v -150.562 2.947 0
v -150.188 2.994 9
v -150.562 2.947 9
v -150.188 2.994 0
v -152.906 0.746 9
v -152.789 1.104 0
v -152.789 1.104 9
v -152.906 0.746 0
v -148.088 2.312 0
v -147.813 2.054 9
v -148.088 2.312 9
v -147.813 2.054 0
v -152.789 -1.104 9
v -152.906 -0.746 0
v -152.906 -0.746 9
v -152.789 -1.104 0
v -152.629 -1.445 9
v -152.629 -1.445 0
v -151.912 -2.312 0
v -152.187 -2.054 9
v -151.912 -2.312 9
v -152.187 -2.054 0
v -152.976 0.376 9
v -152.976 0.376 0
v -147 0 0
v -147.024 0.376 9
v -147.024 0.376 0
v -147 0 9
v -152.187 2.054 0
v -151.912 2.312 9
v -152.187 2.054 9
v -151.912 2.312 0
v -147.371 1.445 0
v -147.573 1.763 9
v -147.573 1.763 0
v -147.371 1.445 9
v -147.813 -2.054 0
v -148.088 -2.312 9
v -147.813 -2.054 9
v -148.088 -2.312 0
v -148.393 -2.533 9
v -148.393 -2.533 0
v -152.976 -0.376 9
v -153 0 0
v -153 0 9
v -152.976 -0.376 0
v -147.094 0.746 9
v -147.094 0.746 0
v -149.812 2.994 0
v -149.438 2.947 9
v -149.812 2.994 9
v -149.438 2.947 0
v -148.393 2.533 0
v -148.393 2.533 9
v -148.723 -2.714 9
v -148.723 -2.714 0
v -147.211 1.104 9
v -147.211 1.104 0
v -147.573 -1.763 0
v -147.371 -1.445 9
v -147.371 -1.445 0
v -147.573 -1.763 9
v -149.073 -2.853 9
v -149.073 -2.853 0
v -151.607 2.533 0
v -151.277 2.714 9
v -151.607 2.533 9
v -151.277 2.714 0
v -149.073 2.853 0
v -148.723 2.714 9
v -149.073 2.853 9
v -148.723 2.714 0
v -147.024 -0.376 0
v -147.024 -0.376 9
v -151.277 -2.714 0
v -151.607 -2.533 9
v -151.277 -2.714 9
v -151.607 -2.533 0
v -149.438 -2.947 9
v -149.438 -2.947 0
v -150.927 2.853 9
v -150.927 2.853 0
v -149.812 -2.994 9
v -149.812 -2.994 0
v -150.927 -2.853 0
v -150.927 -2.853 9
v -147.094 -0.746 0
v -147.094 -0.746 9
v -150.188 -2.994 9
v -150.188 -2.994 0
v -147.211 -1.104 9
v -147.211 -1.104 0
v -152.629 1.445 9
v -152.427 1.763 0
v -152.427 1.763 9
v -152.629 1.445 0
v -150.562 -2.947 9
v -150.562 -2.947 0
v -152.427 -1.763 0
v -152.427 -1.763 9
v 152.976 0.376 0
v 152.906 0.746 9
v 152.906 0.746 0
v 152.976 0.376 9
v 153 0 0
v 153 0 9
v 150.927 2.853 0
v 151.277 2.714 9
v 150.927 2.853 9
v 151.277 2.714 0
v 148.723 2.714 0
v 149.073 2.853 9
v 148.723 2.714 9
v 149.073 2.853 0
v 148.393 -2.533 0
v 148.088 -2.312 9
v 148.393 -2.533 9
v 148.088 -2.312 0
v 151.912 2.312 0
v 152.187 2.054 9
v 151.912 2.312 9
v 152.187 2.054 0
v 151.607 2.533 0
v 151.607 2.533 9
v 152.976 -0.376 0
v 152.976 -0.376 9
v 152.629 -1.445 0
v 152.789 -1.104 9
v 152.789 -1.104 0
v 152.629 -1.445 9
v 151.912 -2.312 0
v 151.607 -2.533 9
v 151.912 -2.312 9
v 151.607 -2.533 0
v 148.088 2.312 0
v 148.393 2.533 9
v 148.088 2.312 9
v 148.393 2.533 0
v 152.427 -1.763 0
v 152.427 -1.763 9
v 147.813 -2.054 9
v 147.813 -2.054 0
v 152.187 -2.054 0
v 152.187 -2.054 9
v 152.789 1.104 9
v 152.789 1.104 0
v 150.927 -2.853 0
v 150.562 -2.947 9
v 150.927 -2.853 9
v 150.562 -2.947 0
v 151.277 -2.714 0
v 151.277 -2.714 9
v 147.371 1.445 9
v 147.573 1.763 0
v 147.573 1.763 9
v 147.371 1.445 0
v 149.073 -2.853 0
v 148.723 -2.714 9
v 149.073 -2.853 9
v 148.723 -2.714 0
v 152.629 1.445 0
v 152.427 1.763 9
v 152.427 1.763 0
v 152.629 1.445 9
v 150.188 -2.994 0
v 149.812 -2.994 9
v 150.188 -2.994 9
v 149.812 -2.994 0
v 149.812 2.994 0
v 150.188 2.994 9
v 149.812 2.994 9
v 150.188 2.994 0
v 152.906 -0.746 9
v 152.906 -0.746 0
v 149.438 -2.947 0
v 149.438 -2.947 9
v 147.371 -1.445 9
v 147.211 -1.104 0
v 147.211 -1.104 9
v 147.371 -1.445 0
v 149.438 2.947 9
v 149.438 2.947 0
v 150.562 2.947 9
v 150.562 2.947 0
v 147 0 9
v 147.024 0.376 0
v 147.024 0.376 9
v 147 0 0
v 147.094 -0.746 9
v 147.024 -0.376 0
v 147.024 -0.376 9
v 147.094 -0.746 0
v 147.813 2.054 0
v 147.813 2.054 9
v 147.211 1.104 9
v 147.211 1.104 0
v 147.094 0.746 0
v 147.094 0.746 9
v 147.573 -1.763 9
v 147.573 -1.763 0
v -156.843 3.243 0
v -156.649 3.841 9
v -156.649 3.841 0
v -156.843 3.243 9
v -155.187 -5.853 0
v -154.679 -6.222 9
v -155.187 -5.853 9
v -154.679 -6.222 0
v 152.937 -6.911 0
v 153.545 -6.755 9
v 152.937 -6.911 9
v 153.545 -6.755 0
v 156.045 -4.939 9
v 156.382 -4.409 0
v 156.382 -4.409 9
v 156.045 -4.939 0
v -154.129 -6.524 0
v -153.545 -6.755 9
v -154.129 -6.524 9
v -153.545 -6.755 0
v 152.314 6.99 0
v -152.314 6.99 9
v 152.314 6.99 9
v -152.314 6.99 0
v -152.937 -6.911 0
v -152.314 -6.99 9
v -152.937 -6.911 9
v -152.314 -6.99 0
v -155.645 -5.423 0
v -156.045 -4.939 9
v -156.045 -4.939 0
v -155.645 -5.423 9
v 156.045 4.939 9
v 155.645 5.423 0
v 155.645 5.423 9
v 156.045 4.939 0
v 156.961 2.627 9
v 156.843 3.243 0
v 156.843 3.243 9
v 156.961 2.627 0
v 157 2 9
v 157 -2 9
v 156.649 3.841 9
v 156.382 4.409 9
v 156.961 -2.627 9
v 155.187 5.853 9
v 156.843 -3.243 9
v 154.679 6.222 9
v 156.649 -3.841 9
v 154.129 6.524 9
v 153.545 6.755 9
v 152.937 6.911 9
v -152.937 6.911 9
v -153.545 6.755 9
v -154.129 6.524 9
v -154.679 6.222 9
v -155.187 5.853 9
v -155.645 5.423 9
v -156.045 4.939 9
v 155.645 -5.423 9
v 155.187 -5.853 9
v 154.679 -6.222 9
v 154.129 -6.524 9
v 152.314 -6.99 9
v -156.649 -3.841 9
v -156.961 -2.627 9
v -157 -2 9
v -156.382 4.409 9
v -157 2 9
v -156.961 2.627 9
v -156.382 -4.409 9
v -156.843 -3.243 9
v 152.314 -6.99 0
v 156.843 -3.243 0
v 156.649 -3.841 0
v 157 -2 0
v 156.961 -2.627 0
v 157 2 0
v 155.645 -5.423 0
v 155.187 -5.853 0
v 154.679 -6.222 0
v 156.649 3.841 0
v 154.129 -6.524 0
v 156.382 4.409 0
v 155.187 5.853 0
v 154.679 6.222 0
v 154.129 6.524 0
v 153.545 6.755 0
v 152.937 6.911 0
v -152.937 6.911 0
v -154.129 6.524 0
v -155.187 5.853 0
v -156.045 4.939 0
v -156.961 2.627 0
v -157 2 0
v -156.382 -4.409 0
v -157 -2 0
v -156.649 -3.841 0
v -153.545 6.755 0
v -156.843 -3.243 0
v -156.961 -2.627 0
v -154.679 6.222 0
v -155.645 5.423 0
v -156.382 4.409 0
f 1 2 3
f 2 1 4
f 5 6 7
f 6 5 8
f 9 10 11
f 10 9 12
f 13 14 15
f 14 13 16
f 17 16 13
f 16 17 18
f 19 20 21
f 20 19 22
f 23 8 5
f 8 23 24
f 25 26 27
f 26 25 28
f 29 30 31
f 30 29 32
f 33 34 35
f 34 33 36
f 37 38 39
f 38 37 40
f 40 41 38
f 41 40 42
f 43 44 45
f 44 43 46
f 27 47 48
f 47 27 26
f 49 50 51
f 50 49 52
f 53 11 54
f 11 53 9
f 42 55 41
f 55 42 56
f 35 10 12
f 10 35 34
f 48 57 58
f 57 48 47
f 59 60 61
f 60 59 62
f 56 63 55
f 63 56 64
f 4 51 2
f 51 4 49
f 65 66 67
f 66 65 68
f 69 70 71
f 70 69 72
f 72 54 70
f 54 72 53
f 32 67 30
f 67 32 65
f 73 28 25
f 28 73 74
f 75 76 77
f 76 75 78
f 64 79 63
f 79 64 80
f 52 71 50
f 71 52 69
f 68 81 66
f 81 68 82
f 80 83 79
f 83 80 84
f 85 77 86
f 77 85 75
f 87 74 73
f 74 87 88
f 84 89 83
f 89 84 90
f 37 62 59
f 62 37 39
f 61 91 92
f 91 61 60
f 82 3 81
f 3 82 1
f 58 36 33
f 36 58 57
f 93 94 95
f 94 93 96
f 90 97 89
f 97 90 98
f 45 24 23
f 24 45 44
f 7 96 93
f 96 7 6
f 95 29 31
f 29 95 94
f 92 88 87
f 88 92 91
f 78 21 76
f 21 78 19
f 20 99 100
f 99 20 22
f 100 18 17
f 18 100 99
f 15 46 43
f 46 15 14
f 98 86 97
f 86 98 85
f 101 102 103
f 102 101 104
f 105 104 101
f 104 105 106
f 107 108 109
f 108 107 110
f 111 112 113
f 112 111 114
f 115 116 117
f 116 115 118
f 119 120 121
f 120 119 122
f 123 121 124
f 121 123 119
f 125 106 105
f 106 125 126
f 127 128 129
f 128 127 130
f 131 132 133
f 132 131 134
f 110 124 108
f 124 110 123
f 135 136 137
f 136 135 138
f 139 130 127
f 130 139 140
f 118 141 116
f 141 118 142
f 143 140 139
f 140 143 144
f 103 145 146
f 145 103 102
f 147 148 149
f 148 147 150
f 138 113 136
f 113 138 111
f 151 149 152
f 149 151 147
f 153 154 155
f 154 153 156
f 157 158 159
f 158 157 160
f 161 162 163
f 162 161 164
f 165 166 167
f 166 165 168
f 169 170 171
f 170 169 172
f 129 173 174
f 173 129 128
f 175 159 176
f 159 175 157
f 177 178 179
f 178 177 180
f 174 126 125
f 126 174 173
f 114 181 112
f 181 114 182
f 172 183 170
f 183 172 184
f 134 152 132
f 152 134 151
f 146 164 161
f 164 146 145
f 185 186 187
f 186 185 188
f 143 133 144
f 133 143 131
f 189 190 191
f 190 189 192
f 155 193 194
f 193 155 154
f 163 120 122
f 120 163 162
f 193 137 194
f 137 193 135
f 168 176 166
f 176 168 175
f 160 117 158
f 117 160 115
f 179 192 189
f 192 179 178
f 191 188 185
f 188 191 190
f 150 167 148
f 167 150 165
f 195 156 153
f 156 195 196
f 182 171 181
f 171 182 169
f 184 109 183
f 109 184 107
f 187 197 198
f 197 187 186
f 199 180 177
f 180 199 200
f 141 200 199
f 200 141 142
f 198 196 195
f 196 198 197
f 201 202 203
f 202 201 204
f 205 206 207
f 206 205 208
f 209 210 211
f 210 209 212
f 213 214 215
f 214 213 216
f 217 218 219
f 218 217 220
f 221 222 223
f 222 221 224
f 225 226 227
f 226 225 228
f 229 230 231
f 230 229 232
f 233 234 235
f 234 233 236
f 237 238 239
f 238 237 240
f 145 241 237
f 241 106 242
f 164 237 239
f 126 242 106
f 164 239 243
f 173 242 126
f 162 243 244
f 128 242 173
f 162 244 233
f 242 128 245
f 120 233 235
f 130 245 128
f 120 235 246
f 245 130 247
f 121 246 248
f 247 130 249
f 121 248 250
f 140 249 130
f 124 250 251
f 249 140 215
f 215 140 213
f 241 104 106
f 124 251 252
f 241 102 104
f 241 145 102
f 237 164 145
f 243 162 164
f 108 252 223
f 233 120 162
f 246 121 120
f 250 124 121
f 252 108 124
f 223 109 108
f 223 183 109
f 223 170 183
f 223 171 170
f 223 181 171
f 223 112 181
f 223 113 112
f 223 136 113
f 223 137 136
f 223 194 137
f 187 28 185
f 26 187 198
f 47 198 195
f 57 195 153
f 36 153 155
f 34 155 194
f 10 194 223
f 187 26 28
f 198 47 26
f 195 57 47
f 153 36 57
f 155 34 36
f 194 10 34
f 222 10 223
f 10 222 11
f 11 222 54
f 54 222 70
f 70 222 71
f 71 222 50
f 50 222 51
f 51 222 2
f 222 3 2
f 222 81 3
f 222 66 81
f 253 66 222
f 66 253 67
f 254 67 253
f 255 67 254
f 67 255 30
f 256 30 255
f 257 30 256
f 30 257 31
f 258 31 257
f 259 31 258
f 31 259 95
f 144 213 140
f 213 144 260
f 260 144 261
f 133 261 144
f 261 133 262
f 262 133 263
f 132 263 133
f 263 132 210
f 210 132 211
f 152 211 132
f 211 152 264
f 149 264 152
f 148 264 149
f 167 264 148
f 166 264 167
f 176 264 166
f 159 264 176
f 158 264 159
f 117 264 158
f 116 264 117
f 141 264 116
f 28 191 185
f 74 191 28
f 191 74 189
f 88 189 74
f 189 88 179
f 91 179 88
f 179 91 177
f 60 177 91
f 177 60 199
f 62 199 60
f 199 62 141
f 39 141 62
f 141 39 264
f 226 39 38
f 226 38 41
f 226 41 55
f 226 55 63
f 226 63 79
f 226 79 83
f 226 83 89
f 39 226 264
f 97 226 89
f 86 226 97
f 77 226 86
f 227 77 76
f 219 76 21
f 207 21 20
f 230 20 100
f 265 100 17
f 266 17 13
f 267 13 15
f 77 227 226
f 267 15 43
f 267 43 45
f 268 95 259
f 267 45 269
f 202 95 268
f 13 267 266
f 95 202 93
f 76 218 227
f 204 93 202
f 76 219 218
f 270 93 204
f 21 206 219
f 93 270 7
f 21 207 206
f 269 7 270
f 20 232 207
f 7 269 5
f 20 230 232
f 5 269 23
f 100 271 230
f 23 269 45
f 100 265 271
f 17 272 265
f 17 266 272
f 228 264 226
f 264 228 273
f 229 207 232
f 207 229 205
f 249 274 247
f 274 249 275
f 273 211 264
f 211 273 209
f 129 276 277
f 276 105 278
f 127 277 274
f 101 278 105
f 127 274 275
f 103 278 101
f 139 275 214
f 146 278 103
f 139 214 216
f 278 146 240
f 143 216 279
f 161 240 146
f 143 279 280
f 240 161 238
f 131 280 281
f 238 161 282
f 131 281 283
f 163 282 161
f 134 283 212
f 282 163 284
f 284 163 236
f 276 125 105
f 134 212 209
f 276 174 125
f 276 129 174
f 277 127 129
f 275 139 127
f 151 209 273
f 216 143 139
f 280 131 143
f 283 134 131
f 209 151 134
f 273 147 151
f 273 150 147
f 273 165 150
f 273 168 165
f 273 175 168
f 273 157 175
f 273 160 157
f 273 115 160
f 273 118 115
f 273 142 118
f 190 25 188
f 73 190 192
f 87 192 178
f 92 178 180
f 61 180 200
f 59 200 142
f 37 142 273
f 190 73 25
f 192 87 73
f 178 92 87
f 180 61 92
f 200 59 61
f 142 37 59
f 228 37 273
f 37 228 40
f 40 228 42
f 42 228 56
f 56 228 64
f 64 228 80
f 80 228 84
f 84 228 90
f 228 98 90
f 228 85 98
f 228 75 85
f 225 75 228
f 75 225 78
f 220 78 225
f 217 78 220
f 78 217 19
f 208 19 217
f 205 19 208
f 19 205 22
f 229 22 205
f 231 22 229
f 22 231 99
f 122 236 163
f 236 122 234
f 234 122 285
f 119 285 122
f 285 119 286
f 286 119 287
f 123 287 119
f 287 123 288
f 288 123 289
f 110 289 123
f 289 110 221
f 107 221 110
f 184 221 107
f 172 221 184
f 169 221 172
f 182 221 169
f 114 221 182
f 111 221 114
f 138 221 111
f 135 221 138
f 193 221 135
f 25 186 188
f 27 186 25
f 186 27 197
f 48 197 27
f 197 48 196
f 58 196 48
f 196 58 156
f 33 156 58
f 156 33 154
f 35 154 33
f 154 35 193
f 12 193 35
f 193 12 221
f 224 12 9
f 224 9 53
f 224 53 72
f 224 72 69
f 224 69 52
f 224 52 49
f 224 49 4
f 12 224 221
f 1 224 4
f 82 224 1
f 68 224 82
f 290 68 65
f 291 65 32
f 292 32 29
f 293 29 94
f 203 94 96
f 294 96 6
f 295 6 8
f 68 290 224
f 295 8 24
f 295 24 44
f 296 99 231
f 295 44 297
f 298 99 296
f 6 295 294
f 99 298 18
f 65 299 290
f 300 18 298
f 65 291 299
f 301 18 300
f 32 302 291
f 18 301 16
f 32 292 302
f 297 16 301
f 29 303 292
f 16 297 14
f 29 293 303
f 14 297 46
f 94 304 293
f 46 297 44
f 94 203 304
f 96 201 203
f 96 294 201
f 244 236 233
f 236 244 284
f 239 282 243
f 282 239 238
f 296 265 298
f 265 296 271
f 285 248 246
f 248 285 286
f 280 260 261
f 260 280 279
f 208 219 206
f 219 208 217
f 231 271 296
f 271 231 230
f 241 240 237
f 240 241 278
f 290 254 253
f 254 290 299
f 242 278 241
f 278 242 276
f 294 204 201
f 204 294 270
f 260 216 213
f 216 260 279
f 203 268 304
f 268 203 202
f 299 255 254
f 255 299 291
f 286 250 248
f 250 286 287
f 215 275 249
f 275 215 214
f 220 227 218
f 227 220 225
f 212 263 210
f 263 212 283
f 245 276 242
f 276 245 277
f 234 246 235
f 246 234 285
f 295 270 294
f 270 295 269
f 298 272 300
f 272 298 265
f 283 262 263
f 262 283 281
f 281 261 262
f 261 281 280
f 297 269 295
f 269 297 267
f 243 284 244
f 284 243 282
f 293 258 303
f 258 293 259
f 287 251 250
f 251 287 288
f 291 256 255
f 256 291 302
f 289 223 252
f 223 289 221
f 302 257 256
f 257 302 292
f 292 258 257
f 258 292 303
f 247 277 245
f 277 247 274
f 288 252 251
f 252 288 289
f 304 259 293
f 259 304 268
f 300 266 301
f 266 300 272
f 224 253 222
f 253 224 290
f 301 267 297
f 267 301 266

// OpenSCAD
$fn = 50;


difference() {
	union() {
		hull() {
			translate(v = [-152.0000000000, 2.0000000000, 0]) {
				cylinder(h = 9, r = 5);
			}
			translate(v = [152.0000000000, 2.0000000000, 0]) {
				cylinder(h = 9, r = 5);
			}
			translate(v = [-152.0000000000, -2.0000000000, 0]) {
				cylinder(h = 9, r = 5);
			}
			translate(v = [152.0000000000, -2.0000000000, 0]) {
				cylinder(h = 9, r = 5);
			}
		}
	}
	union() {
		translate(v = [-150.0000000000, 0.0000000000, -100.0000000000]) {
			cylinder(h = 200, r = 3.0000000000);
		}
		translate(v = [-150.0000000000, 0.0000000000, -100.0000000000]) {
			cylinder(h = 200, r = 3.0000000000);
		}
		translate(v = [150.0000000000, 0.0000000000, -100.0000000000]) {
			cylinder(h = 200, r = 3.0000000000);
		}
		translate(v = [150.0000000000, 0.0000000000, -100.0000000000]) {
			cylinder(h = 200, r = 3.0000000000);
		}
	}
}
